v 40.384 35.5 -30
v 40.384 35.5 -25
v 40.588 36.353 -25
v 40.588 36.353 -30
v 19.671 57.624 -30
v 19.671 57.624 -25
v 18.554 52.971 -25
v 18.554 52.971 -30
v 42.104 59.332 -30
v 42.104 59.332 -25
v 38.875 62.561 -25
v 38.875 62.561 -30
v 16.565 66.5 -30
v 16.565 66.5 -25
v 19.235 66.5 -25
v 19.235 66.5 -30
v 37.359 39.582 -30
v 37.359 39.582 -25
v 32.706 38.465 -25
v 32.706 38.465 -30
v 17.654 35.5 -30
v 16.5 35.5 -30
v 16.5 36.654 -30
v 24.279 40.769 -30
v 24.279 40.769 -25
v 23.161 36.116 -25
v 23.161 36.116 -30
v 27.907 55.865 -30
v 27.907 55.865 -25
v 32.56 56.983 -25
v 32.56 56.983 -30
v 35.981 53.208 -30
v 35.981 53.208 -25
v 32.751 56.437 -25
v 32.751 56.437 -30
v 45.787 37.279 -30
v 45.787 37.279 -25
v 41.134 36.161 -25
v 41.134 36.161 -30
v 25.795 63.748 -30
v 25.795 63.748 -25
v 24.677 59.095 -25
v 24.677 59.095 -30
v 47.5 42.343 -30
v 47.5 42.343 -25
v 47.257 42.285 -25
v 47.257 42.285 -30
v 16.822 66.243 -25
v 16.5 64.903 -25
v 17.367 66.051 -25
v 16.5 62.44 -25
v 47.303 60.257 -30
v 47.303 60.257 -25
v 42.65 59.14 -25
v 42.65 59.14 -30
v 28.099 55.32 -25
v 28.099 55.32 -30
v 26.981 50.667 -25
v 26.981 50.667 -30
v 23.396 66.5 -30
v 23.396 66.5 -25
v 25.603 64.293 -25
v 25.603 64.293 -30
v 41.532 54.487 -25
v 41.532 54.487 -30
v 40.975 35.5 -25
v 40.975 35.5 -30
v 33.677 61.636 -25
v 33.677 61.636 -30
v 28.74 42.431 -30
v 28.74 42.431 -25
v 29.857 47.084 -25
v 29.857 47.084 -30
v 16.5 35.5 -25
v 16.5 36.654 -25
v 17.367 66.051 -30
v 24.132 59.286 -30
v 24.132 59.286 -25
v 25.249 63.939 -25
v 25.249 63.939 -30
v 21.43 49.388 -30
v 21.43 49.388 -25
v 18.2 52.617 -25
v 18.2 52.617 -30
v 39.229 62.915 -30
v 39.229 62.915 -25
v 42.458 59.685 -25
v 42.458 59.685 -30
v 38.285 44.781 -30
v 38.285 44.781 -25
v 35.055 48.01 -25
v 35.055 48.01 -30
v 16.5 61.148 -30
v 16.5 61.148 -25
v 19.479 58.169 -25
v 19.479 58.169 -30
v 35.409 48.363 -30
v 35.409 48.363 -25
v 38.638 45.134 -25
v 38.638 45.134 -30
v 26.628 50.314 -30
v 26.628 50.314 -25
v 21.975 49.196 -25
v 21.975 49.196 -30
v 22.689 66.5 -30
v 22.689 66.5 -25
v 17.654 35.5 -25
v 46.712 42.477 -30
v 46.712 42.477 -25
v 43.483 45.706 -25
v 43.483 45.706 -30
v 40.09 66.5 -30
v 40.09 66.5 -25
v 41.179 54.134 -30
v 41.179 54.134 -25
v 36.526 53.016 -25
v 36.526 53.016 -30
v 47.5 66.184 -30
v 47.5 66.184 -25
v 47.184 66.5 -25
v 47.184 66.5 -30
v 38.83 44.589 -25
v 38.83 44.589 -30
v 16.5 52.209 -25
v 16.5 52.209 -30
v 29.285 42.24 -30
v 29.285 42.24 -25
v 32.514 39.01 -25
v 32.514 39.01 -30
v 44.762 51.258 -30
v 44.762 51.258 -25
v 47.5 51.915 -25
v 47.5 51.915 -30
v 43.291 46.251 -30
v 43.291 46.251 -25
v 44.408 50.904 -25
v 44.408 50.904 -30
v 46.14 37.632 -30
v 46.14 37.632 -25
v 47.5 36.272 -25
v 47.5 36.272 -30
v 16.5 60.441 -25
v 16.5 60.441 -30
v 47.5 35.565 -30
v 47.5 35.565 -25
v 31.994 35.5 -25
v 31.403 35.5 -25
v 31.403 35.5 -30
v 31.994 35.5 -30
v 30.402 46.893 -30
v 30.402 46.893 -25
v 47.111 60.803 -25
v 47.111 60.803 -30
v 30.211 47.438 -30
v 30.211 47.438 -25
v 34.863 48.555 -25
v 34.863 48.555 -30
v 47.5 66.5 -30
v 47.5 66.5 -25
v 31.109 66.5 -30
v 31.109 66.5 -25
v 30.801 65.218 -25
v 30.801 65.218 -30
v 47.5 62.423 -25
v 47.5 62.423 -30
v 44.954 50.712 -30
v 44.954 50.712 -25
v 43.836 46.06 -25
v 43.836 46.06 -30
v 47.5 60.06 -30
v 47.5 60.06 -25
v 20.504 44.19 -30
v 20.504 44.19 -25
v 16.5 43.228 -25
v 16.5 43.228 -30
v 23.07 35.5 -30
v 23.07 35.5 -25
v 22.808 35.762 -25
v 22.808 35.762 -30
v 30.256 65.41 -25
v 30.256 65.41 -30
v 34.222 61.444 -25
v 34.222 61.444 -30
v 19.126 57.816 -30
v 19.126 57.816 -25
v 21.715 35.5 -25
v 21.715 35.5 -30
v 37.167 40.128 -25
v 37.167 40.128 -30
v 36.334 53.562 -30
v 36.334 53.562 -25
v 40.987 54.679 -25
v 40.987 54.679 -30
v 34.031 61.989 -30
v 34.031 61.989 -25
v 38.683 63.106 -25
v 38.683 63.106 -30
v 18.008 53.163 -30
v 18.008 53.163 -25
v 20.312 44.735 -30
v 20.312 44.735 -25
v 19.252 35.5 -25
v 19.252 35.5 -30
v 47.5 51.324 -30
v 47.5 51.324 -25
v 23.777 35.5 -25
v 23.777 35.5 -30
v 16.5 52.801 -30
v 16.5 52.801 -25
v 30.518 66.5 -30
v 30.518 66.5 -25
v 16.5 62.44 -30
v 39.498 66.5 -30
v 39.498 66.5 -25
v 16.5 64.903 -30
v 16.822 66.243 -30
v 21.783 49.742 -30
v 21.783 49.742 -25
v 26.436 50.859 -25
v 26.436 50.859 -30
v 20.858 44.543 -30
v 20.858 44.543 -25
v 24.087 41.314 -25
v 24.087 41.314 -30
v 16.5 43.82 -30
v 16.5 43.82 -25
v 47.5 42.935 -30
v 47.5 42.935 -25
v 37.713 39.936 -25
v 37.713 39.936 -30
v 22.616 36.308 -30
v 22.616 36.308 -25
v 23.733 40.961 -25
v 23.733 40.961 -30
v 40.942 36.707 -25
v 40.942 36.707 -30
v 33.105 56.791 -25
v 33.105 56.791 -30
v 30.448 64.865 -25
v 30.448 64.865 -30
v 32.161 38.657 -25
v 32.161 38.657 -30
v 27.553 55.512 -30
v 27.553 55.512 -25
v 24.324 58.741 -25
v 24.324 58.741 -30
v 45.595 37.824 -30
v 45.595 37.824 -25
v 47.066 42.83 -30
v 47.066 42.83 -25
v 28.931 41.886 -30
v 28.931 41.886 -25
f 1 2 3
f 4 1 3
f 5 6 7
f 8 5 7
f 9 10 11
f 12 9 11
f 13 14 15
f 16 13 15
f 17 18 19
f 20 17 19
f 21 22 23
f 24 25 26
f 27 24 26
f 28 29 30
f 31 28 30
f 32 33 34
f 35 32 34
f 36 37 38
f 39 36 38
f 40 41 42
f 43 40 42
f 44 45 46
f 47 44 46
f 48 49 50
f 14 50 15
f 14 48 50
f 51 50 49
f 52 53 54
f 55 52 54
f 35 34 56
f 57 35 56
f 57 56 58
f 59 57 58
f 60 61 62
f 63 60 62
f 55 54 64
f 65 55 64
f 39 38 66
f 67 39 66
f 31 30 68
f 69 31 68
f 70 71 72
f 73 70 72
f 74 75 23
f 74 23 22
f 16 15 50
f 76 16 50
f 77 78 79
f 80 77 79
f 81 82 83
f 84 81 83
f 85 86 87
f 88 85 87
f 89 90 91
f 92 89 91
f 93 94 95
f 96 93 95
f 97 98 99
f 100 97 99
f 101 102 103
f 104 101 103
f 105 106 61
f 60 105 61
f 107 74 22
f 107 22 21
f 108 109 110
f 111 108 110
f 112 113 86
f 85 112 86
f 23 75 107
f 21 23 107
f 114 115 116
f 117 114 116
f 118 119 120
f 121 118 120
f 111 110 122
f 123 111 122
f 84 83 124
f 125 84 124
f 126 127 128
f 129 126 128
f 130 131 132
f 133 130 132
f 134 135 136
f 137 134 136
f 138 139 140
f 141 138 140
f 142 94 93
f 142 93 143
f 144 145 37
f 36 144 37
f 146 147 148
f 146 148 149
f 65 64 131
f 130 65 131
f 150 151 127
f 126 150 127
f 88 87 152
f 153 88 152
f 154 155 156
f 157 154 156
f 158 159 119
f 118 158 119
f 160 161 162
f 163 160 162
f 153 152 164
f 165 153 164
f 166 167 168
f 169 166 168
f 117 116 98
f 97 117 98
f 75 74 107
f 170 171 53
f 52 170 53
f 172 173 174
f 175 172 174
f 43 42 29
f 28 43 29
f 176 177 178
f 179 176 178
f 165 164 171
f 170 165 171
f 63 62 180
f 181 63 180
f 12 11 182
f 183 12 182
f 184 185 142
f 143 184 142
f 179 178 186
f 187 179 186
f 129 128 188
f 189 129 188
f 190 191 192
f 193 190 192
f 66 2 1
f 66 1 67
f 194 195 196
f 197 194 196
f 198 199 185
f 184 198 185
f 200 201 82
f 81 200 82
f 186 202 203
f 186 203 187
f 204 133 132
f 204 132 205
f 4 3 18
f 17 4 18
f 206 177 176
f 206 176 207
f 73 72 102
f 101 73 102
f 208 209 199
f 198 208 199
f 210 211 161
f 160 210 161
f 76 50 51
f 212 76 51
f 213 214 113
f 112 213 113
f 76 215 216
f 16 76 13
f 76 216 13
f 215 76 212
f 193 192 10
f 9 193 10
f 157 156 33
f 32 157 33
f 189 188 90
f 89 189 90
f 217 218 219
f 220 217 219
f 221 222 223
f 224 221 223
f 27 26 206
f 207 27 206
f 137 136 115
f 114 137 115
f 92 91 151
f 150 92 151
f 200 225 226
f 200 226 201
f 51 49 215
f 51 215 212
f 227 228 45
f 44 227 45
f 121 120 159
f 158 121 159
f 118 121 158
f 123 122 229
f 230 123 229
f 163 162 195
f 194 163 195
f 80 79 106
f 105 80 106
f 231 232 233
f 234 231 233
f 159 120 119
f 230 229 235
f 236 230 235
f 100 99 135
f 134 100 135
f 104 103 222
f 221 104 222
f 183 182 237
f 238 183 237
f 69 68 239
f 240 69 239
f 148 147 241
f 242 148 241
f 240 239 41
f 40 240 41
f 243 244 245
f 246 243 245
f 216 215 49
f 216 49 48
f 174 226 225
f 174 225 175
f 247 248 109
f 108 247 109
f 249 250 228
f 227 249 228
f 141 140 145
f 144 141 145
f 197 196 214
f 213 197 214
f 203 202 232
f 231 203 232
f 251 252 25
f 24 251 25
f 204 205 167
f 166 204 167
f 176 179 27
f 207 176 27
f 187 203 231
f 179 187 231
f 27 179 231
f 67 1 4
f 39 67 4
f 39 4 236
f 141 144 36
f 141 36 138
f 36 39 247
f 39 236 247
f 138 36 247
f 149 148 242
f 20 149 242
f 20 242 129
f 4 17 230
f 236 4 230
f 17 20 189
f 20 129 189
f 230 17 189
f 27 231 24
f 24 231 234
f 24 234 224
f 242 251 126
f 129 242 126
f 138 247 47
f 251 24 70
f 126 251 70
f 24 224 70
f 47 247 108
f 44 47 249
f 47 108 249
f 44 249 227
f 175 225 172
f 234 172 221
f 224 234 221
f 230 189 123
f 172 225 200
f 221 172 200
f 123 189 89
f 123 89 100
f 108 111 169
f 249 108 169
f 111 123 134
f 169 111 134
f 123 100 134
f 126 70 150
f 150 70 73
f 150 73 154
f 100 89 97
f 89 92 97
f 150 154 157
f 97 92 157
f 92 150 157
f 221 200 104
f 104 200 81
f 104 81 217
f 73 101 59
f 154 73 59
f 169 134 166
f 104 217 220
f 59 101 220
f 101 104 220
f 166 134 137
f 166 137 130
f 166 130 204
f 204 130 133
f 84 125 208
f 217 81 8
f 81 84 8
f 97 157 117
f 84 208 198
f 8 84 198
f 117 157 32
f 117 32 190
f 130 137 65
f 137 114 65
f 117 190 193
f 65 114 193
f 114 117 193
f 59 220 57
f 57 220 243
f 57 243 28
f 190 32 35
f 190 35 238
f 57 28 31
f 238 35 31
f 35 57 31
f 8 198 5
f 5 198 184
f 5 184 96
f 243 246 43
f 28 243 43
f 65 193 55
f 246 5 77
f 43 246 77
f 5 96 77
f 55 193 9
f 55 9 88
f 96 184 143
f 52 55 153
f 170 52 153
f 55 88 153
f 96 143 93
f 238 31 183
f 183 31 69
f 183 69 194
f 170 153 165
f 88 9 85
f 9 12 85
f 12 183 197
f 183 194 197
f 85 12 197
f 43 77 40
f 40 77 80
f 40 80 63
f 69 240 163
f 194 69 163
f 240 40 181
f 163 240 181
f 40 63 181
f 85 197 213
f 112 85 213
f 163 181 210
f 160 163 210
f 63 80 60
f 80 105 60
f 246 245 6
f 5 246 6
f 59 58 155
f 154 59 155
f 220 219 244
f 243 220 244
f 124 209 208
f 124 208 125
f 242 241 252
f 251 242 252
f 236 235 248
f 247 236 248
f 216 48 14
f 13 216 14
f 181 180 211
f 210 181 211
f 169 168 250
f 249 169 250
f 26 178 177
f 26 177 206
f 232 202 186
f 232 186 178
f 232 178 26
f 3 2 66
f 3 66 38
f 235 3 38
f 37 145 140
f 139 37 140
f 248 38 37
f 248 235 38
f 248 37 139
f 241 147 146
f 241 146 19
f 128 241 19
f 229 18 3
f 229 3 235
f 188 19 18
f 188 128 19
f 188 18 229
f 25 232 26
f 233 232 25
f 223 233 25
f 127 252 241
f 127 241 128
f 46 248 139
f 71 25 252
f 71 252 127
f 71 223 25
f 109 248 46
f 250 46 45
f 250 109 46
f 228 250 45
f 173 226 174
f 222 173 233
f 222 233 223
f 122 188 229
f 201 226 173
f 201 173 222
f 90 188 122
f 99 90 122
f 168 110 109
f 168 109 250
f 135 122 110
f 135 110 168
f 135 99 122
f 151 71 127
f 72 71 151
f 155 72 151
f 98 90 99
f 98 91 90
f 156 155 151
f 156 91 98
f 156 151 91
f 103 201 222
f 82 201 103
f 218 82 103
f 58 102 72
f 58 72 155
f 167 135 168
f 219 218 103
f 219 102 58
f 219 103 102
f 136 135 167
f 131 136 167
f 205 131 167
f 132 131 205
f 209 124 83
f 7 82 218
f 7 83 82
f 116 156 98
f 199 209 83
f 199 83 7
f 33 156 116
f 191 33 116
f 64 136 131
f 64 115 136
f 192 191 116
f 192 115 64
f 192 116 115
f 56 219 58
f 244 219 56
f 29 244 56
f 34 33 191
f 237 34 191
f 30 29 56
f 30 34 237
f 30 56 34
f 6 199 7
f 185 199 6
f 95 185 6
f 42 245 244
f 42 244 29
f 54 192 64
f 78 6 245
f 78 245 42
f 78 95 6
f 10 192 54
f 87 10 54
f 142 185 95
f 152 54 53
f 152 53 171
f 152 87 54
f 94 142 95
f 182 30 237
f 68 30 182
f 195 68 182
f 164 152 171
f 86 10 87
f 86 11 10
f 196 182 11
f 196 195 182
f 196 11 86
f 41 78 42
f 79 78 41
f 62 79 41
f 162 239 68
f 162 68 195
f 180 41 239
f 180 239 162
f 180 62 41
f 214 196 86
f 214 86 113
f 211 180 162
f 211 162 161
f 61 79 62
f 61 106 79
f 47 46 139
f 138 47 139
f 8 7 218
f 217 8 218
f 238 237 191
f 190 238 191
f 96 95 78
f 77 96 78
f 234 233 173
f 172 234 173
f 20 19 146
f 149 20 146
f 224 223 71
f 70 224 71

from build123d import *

# Parameters (mm, degrees)
SKETCH120_W                                   = 31
SKETCH120_H                                   = 31
EXTRUDE109_DEPTH                              = 5
GRIDSKETCH002_AS_DRAWN_W                      = 56.791651
GRIDSKETCH002_AS_DRAWN_H                      = 81.381905
EXTRUDE084_DEPTH                              = 5
EXTRUDE084_ONTO_GRIDSKETCH002_PLACEMENT_ANGLE = 45


with BuildPart() as extrude109:
    # Sketch120 → Extrude109 (new body)
    with BuildSketch(Plane(origin=(0, 0, -25), x_dir=(1, 0, 0), z_dir=(0, 0, -1))):
        with Locations((32, -51)):
            Rectangle(SKETCH120_W, SKETCH120_H)
    extrude(amount=EXTRUDE109_DEPTH)


with BuildPart() as common004:
    # gridsketch002 as drawn → Extrude084 (new)
    with BuildSketch(Plane.XY):
        with Locations((23.815698, 35.440953)):
            Rectangle(GRIDSKETCH002_AS_DRAWN_W, GRIDSKETCH002_AS_DRAWN_H)
        Polygon((0, 4.783494), (-4.080127, 2.283494), (-4.080127, -2.283494), (0, -4.783494), (4.080127, -2.283494), (4.080127, 2.283494), align=None, mode=Mode.SUBTRACT)
        Polygon((8.660254, 4.783494), (4.580127, 2.283494), (4.580127, -2.283494), (8.660254, -4.783494), (12.740381, -2.283494), (12.740381, 2.283494), align=None, mode=Mode.SUBTRACT)
        Polygon((17.320508, 4.783494), (13.240381, 2.283494), (13.240381, -2.283494), (17.320508, -4.783494), (21.400635, -2.283494), (21.400635, 2.283494), align=None, mode=Mode.SUBTRACT)
        Polygon((25.980762, 4.783494), (21.900635, 2.283494), (21.900635, -2.283494), (25.980762, -4.783494), (30.060889, -2.283494), (30.060889, 2.283494), align=None, mode=Mode.SUBTRACT)
        Polygon((34.641016, 4.783494), (30.560889, 2.283494), (30.560889, -2.283494), (34.641016, -4.783494), (38.721143, -2.283494), (38.721143, 2.283494), align=None, mode=Mode.SUBTRACT)
        Polygon((43.30127, 4.783494), (39.221143, 2.283494), (39.221143, -2.283494), (43.30127, -4.783494), (47.381397, -2.283494), (47.381397, 2.283494), align=None, mode=Mode.SUBTRACT)
        Polygon((4.330127, 12.371684), (0.25, 9.871684), (0.25, 5.304697), (4.330127, 2.804697), (8.410254, 5.304697), (8.410254, 9.871684), align=None, mode=Mode.SUBTRACT)
        Polygon((12.990381, 12.371684), (8.910254, 9.871684), (8.910254, 5.304697), (12.990381, 2.804697), (17.070508, 5.304697), (17.070508, 9.871684), align=None, mode=Mode.SUBTRACT)
        Polygon((21.650635, 12.371684), (17.570508, 9.871684), (17.570508, 5.304697), (21.650635, 2.804697), (25.730762, 5.304697), (25.730762, 9.871684), align=None, mode=Mode.SUBTRACT)
        Polygon((30.310889, 12.371684), (26.230762, 9.871684), (26.230762, 5.304697), (30.310889, 2.804697), (34.391016, 5.304697), (34.391016, 9.871684), align=None, mode=Mode.SUBTRACT)
        Polygon((38.971143, 12.371684), (34.891016, 9.871684), (34.891016, 5.304697), (38.971143, 2.804697), (43.05127, 5.304697), (43.05127, 9.871684), align=None, mode=Mode.SUBTRACT)
        Polygon((47.631397, 12.371684), (43.55127, 9.871684), (43.55127, 5.304697), (47.631397, 2.804697), (51.711524, 5.304697), (51.711524, 9.871684), align=None, mode=Mode.SUBTRACT)
        Polygon((0, 19.959875), (-4.080127, 17.459875), (-4.080127, 12.892887), (0, 10.392887), (4.080127, 12.892887), (4.080127, 17.459875), align=None, mode=Mode.SUBTRACT)
        Polygon((8.660254, 19.959875), (4.580127, 17.459875), (4.580127, 12.892887), (8.660254, 10.392887), (12.740381, 12.892887), (12.740381, 17.459875), align=None, mode=Mode.SUBTRACT)
        Polygon((17.320508, 19.959875), (13.240381, 17.459875), (13.240381, 12.892887), (17.320508, 10.392887), (21.400635, 12.892887), (21.400635, 17.459875), align=None, mode=Mode.SUBTRACT)
        Polygon((25.980762, 19.959875), (21.900635, 17.459875), (21.900635, 12.892887), (25.980762, 10.392887), (30.060889, 12.892887), (30.060889, 17.459875), align=None, mode=Mode.SUBTRACT)
        Polygon((34.641016, 19.959875), (30.560889, 17.459875), (30.560889, 12.892887), (34.641016, 10.392887), (38.721143, 12.892887), (38.721143, 17.459875), align=None, mode=Mode.SUBTRACT)
        Polygon((43.30127, 19.959875), (39.221143, 17.459875), (39.221143, 12.892887), (43.30127, 10.392887), (47.381397, 12.892887), (47.381397, 17.459875), align=None, mode=Mode.SUBTRACT)
        Polygon((4.330127, 27.548065), (0.25, 25.048065), (0.25, 20.481078), (4.330127, 17.981078), (8.410254, 20.481078), (8.410254, 25.048065), align=None, mode=Mode.SUBTRACT)
        Polygon((12.990381, 27.548065), (8.910254, 25.048065), (8.910254, 20.481078), (12.990381, 17.981078), (17.070508, 20.481078), (17.070508, 25.048065), align=None, mode=Mode.SUBTRACT)
        Polygon((21.650635, 27.548065), (17.570508, 25.048065), (17.570508, 20.481078), (21.650635, 17.981078), (25.730762, 20.481078), (25.730762, 25.048065), align=None, mode=Mode.SUBTRACT)
        Polygon((30.310889, 27.548065), (26.230762, 25.048065), (26.230762, 20.481078), (30.310889, 17.981078), (34.391016, 20.481078), (34.391016, 25.048065), align=None, mode=Mode.SUBTRACT)
        Polygon((38.971143, 27.548065), (34.891016, 25.048065), (34.891016, 20.481078), (38.971143, 17.981078), (43.05127, 20.481078), (43.05127, 25.048065), align=None, mode=Mode.SUBTRACT)
        Polygon((47.631397, 27.548065), (43.55127, 25.048065), (43.55127, 20.481078), (47.631397, 17.981078), (51.711524, 20.481078), (51.711524, 25.048065), align=None, mode=Mode.SUBTRACT)
        Polygon((0, 35.136255), (-4.080127, 32.636255), (-4.080127, 28.069268), (0, 25.569268), (4.080127, 28.069268), (4.080127, 32.636255), align=None, mode=Mode.SUBTRACT)
        Polygon((8.660254, 35.136255), (4.580127, 32.636255), (4.580127, 28.069268), (8.660254, 25.569268), (12.740381, 28.069268), (12.740381, 32.636255), align=None, mode=Mode.SUBTRACT)
        Polygon((17.320508, 35.136255), (13.240381, 32.636255), (13.240381, 28.069268), (17.320508, 25.569268), (21.400635, 28.069268), (21.400635, 32.636255), align=None, mode=Mode.SUBTRACT)
        Polygon((25.980762, 35.136255), (21.900635, 32.636255), (21.900635, 28.069268), (25.980762, 25.569268), (30.060889, 28.069268), (30.060889, 32.636255), align=None, mode=Mode.SUBTRACT)
        Polygon((34.641016, 35.136255), (30.560889, 32.636255), (30.560889, 28.069268), (34.641016, 25.569268), (38.721143, 28.069268), (38.721143, 32.636255), align=None, mode=Mode.SUBTRACT)
        Polygon((43.30127, 35.136255), (39.221143, 32.636255), (39.221143, 28.069268), (43.30127, 25.569268), (47.381397, 28.069268), (47.381397, 32.636255), align=None, mode=Mode.SUBTRACT)
        Polygon((4.330127, 42.724446), (0.25, 40.224446), (0.25, 35.657459), (4.330127, 33.157459), (8.410254, 35.657459), (8.410254, 40.224446), align=None, mode=Mode.SUBTRACT)
        Polygon((12.990381, 42.724446), (8.910254, 40.224446), (8.910254, 35.657459), (12.990381, 33.157459), (17.070508, 35.657459), (17.070508, 40.224446), align=None, mode=Mode.SUBTRACT)
        Polygon((21.650635, 42.724446), (17.570508, 40.224446), (17.570508, 35.657459), (21.650635, 33.157459), (25.730762, 35.657459), (25.730762, 40.224446), align=None, mode=Mode.SUBTRACT)
        Polygon((30.310889, 42.724446), (26.230762, 40.224446), (26.230762, 35.657459), (30.310889, 33.157459), (34.391016, 35.657459), (34.391016, 40.224446), align=None, mode=Mode.SUBTRACT)
        Polygon((38.971143, 42.724446), (34.891016, 40.224446), (34.891016, 35.657459), (38.971143, 33.157459), (43.05127, 35.657459), (43.05127, 40.224446), align=None, mode=Mode.SUBTRACT)
        Polygon((47.631397, 42.724446), (43.55127, 40.224446), (43.55127, 35.657459), (47.631397, 33.157459), (51.711524, 35.657459), (51.711524, 40.224446), align=None, mode=Mode.SUBTRACT)
        Polygon((0, 50.312636), (-4.080127, 47.812636), (-4.080127, 43.245649), (0, 40.745649), (4.080127, 43.245649), (4.080127, 47.812636), align=None, mode=Mode.SUBTRACT)
        Polygon((8.660254, 50.312636), (4.580127, 47.812636), (4.580127, 43.245649), (8.660254, 40.745649), (12.740381, 43.245649), (12.740381, 47.812636), align=None, mode=Mode.SUBTRACT)
        Polygon((17.320508, 50.312636), (13.240381, 47.812636), (13.240381, 43.245649), (17.320508, 40.745649), (21.400635, 43.245649), (21.400635, 47.812636), align=None, mode=Mode.SUBTRACT)
        Polygon((25.980762, 50.312636), (21.900635, 47.812636), (21.900635, 43.245649), (25.980762, 40.745649), (30.060889, 43.245649), (30.060889, 47.812636), align=None, mode=Mode.SUBTRACT)
        Polygon((34.641016, 50.312636), (30.560889, 47.812636), (30.560889, 43.245649), (34.641016, 40.745649), (38.721143, 43.245649), (38.721143, 47.812636), align=None, mode=Mode.SUBTRACT)
        Polygon((43.30127, 50.312636), (39.221143, 47.812636), (39.221143, 43.245649), (43.30127, 40.745649), (47.381397, 43.245649), (47.381397, 47.812636), align=None, mode=Mode.SUBTRACT)
        Polygon((4.330127, 57.900827), (0.25, 55.400827), (0.25, 50.83384), (4.330127, 48.33384), (8.410254, 50.83384), (8.410254, 55.400827), align=None, mode=Mode.SUBTRACT)
        Polygon((12.990381, 57.900827), (8.910254, 55.400827), (8.910254, 50.83384), (12.990381, 48.33384), (17.070508, 50.83384), (17.070508, 55.400827), align=None, mode=Mode.SUBTRACT)
        Polygon((21.650635, 57.900827), (17.570508, 55.400827), (17.570508, 50.83384), (21.650635, 48.33384), (25.730762, 50.83384), (25.730762, 55.400827), align=None, mode=Mode.SUBTRACT)
        Polygon((30.310889, 57.900827), (26.230762, 55.400827), (26.230762, 50.83384), (30.310889, 48.33384), (34.391016, 50.83384), (34.391016, 55.400827), align=None, mode=Mode.SUBTRACT)
        Polygon((38.971143, 57.900827), (34.891016, 55.400827), (34.891016, 50.83384), (38.971143, 48.33384), (43.05127, 50.83384), (43.05127, 55.400827), align=None, mode=Mode.SUBTRACT)
        Polygon((47.631397, 57.900827), (43.55127, 55.400827), (43.55127, 50.83384), (47.631397, 48.33384), (51.711524, 50.83384), (51.711524, 55.400827), align=None, mode=Mode.SUBTRACT)
        Polygon((0, 65.489017), (-4.080127, 62.989017), (-4.080127, 58.42203), (0, 55.92203), (4.080127, 58.42203), (4.080127, 62.989017), align=None, mode=Mode.SUBTRACT)
        Polygon((8.660254, 65.489017), (4.580127, 62.989017), (4.580127, 58.42203), (8.660254, 55.92203), (12.740381, 58.42203), (12.740381, 62.989017), align=None, mode=Mode.SUBTRACT)
        Polygon((17.320508, 65.489017), (13.240381, 62.989017), (13.240381, 58.42203), (17.320508, 55.92203), (21.400635, 58.42203), (21.400635, 62.989017), align=None, mode=Mode.SUBTRACT)
        Polygon((25.980762, 65.489017), (21.900635, 62.989017), (21.900635, 58.42203), (25.980762, 55.92203), (30.060889, 58.42203), (30.060889, 62.989017), align=None, mode=Mode.SUBTRACT)
        Polygon((34.641016, 65.489017), (30.560889, 62.989017), (30.560889, 58.42203), (34.641016, 55.92203), (38.721143, 58.42203), (38.721143, 62.989017), align=None, mode=Mode.SUBTRACT)
        Polygon((43.30127, 65.489017), (39.221143, 62.989017), (39.221143, 58.42203), (43.30127, 55.92203), (47.381397, 58.42203), (47.381397, 62.989017), align=None, mode=Mode.SUBTRACT)
        Polygon((4.330127, 73.077208), (0.25, 70.577208), (0.25, 66.01022), (4.330127, 63.51022), (8.410254, 66.01022), (8.410254, 70.577208), align=None, mode=Mode.SUBTRACT)
        Polygon((12.990381, 73.077208), (8.910254, 70.577208), (8.910254, 66.01022), (12.990381, 63.51022), (17.070508, 66.01022), (17.070508, 70.577208), align=None, mode=Mode.SUBTRACT)
        Polygon((21.650635, 73.077208), (17.570508, 70.577208), (17.570508, 66.01022), (21.650635, 63.51022), (25.730762, 66.01022), (25.730762, 70.577208), align=None, mode=Mode.SUBTRACT)
        Polygon((30.310889, 73.077208), (26.230762, 70.577208), (26.230762, 66.01022), (30.310889, 63.51022), (34.391016, 66.01022), (34.391016, 70.577208), align=None, mode=Mode.SUBTRACT)
        Polygon((38.971143, 73.077208), (34.891016, 70.577208), (34.891016, 66.01022), (38.971143, 63.51022), (43.05127, 66.01022), (43.05127, 70.577208), align=None, mode=Mode.SUBTRACT)
        Polygon((47.631397, 73.077208), (43.55127, 70.577208), (43.55127, 66.01022), (47.631397, 63.51022), (51.711524, 66.01022), (51.711524, 70.577208), align=None, mode=Mode.SUBTRACT)
    extrude(amount=-EXTRUDE084_DEPTH)


with BuildPart() as common004_1:
    # Extrude084 onto gridsketch002 placement: moved
    add(common004.part.moved(Location((43, 9.8, -25))).rotate(Axis((43, 9.8, -25), (0, 0, 1)), EXTRUDE084_ONTO_GRIDSKETCH002_PLACEMENT_ANGLE))

    # Common004: intersect Extrude109
    add(extrude109.part, mode=Mode.INTERSECT)


solid = common004_1.part
